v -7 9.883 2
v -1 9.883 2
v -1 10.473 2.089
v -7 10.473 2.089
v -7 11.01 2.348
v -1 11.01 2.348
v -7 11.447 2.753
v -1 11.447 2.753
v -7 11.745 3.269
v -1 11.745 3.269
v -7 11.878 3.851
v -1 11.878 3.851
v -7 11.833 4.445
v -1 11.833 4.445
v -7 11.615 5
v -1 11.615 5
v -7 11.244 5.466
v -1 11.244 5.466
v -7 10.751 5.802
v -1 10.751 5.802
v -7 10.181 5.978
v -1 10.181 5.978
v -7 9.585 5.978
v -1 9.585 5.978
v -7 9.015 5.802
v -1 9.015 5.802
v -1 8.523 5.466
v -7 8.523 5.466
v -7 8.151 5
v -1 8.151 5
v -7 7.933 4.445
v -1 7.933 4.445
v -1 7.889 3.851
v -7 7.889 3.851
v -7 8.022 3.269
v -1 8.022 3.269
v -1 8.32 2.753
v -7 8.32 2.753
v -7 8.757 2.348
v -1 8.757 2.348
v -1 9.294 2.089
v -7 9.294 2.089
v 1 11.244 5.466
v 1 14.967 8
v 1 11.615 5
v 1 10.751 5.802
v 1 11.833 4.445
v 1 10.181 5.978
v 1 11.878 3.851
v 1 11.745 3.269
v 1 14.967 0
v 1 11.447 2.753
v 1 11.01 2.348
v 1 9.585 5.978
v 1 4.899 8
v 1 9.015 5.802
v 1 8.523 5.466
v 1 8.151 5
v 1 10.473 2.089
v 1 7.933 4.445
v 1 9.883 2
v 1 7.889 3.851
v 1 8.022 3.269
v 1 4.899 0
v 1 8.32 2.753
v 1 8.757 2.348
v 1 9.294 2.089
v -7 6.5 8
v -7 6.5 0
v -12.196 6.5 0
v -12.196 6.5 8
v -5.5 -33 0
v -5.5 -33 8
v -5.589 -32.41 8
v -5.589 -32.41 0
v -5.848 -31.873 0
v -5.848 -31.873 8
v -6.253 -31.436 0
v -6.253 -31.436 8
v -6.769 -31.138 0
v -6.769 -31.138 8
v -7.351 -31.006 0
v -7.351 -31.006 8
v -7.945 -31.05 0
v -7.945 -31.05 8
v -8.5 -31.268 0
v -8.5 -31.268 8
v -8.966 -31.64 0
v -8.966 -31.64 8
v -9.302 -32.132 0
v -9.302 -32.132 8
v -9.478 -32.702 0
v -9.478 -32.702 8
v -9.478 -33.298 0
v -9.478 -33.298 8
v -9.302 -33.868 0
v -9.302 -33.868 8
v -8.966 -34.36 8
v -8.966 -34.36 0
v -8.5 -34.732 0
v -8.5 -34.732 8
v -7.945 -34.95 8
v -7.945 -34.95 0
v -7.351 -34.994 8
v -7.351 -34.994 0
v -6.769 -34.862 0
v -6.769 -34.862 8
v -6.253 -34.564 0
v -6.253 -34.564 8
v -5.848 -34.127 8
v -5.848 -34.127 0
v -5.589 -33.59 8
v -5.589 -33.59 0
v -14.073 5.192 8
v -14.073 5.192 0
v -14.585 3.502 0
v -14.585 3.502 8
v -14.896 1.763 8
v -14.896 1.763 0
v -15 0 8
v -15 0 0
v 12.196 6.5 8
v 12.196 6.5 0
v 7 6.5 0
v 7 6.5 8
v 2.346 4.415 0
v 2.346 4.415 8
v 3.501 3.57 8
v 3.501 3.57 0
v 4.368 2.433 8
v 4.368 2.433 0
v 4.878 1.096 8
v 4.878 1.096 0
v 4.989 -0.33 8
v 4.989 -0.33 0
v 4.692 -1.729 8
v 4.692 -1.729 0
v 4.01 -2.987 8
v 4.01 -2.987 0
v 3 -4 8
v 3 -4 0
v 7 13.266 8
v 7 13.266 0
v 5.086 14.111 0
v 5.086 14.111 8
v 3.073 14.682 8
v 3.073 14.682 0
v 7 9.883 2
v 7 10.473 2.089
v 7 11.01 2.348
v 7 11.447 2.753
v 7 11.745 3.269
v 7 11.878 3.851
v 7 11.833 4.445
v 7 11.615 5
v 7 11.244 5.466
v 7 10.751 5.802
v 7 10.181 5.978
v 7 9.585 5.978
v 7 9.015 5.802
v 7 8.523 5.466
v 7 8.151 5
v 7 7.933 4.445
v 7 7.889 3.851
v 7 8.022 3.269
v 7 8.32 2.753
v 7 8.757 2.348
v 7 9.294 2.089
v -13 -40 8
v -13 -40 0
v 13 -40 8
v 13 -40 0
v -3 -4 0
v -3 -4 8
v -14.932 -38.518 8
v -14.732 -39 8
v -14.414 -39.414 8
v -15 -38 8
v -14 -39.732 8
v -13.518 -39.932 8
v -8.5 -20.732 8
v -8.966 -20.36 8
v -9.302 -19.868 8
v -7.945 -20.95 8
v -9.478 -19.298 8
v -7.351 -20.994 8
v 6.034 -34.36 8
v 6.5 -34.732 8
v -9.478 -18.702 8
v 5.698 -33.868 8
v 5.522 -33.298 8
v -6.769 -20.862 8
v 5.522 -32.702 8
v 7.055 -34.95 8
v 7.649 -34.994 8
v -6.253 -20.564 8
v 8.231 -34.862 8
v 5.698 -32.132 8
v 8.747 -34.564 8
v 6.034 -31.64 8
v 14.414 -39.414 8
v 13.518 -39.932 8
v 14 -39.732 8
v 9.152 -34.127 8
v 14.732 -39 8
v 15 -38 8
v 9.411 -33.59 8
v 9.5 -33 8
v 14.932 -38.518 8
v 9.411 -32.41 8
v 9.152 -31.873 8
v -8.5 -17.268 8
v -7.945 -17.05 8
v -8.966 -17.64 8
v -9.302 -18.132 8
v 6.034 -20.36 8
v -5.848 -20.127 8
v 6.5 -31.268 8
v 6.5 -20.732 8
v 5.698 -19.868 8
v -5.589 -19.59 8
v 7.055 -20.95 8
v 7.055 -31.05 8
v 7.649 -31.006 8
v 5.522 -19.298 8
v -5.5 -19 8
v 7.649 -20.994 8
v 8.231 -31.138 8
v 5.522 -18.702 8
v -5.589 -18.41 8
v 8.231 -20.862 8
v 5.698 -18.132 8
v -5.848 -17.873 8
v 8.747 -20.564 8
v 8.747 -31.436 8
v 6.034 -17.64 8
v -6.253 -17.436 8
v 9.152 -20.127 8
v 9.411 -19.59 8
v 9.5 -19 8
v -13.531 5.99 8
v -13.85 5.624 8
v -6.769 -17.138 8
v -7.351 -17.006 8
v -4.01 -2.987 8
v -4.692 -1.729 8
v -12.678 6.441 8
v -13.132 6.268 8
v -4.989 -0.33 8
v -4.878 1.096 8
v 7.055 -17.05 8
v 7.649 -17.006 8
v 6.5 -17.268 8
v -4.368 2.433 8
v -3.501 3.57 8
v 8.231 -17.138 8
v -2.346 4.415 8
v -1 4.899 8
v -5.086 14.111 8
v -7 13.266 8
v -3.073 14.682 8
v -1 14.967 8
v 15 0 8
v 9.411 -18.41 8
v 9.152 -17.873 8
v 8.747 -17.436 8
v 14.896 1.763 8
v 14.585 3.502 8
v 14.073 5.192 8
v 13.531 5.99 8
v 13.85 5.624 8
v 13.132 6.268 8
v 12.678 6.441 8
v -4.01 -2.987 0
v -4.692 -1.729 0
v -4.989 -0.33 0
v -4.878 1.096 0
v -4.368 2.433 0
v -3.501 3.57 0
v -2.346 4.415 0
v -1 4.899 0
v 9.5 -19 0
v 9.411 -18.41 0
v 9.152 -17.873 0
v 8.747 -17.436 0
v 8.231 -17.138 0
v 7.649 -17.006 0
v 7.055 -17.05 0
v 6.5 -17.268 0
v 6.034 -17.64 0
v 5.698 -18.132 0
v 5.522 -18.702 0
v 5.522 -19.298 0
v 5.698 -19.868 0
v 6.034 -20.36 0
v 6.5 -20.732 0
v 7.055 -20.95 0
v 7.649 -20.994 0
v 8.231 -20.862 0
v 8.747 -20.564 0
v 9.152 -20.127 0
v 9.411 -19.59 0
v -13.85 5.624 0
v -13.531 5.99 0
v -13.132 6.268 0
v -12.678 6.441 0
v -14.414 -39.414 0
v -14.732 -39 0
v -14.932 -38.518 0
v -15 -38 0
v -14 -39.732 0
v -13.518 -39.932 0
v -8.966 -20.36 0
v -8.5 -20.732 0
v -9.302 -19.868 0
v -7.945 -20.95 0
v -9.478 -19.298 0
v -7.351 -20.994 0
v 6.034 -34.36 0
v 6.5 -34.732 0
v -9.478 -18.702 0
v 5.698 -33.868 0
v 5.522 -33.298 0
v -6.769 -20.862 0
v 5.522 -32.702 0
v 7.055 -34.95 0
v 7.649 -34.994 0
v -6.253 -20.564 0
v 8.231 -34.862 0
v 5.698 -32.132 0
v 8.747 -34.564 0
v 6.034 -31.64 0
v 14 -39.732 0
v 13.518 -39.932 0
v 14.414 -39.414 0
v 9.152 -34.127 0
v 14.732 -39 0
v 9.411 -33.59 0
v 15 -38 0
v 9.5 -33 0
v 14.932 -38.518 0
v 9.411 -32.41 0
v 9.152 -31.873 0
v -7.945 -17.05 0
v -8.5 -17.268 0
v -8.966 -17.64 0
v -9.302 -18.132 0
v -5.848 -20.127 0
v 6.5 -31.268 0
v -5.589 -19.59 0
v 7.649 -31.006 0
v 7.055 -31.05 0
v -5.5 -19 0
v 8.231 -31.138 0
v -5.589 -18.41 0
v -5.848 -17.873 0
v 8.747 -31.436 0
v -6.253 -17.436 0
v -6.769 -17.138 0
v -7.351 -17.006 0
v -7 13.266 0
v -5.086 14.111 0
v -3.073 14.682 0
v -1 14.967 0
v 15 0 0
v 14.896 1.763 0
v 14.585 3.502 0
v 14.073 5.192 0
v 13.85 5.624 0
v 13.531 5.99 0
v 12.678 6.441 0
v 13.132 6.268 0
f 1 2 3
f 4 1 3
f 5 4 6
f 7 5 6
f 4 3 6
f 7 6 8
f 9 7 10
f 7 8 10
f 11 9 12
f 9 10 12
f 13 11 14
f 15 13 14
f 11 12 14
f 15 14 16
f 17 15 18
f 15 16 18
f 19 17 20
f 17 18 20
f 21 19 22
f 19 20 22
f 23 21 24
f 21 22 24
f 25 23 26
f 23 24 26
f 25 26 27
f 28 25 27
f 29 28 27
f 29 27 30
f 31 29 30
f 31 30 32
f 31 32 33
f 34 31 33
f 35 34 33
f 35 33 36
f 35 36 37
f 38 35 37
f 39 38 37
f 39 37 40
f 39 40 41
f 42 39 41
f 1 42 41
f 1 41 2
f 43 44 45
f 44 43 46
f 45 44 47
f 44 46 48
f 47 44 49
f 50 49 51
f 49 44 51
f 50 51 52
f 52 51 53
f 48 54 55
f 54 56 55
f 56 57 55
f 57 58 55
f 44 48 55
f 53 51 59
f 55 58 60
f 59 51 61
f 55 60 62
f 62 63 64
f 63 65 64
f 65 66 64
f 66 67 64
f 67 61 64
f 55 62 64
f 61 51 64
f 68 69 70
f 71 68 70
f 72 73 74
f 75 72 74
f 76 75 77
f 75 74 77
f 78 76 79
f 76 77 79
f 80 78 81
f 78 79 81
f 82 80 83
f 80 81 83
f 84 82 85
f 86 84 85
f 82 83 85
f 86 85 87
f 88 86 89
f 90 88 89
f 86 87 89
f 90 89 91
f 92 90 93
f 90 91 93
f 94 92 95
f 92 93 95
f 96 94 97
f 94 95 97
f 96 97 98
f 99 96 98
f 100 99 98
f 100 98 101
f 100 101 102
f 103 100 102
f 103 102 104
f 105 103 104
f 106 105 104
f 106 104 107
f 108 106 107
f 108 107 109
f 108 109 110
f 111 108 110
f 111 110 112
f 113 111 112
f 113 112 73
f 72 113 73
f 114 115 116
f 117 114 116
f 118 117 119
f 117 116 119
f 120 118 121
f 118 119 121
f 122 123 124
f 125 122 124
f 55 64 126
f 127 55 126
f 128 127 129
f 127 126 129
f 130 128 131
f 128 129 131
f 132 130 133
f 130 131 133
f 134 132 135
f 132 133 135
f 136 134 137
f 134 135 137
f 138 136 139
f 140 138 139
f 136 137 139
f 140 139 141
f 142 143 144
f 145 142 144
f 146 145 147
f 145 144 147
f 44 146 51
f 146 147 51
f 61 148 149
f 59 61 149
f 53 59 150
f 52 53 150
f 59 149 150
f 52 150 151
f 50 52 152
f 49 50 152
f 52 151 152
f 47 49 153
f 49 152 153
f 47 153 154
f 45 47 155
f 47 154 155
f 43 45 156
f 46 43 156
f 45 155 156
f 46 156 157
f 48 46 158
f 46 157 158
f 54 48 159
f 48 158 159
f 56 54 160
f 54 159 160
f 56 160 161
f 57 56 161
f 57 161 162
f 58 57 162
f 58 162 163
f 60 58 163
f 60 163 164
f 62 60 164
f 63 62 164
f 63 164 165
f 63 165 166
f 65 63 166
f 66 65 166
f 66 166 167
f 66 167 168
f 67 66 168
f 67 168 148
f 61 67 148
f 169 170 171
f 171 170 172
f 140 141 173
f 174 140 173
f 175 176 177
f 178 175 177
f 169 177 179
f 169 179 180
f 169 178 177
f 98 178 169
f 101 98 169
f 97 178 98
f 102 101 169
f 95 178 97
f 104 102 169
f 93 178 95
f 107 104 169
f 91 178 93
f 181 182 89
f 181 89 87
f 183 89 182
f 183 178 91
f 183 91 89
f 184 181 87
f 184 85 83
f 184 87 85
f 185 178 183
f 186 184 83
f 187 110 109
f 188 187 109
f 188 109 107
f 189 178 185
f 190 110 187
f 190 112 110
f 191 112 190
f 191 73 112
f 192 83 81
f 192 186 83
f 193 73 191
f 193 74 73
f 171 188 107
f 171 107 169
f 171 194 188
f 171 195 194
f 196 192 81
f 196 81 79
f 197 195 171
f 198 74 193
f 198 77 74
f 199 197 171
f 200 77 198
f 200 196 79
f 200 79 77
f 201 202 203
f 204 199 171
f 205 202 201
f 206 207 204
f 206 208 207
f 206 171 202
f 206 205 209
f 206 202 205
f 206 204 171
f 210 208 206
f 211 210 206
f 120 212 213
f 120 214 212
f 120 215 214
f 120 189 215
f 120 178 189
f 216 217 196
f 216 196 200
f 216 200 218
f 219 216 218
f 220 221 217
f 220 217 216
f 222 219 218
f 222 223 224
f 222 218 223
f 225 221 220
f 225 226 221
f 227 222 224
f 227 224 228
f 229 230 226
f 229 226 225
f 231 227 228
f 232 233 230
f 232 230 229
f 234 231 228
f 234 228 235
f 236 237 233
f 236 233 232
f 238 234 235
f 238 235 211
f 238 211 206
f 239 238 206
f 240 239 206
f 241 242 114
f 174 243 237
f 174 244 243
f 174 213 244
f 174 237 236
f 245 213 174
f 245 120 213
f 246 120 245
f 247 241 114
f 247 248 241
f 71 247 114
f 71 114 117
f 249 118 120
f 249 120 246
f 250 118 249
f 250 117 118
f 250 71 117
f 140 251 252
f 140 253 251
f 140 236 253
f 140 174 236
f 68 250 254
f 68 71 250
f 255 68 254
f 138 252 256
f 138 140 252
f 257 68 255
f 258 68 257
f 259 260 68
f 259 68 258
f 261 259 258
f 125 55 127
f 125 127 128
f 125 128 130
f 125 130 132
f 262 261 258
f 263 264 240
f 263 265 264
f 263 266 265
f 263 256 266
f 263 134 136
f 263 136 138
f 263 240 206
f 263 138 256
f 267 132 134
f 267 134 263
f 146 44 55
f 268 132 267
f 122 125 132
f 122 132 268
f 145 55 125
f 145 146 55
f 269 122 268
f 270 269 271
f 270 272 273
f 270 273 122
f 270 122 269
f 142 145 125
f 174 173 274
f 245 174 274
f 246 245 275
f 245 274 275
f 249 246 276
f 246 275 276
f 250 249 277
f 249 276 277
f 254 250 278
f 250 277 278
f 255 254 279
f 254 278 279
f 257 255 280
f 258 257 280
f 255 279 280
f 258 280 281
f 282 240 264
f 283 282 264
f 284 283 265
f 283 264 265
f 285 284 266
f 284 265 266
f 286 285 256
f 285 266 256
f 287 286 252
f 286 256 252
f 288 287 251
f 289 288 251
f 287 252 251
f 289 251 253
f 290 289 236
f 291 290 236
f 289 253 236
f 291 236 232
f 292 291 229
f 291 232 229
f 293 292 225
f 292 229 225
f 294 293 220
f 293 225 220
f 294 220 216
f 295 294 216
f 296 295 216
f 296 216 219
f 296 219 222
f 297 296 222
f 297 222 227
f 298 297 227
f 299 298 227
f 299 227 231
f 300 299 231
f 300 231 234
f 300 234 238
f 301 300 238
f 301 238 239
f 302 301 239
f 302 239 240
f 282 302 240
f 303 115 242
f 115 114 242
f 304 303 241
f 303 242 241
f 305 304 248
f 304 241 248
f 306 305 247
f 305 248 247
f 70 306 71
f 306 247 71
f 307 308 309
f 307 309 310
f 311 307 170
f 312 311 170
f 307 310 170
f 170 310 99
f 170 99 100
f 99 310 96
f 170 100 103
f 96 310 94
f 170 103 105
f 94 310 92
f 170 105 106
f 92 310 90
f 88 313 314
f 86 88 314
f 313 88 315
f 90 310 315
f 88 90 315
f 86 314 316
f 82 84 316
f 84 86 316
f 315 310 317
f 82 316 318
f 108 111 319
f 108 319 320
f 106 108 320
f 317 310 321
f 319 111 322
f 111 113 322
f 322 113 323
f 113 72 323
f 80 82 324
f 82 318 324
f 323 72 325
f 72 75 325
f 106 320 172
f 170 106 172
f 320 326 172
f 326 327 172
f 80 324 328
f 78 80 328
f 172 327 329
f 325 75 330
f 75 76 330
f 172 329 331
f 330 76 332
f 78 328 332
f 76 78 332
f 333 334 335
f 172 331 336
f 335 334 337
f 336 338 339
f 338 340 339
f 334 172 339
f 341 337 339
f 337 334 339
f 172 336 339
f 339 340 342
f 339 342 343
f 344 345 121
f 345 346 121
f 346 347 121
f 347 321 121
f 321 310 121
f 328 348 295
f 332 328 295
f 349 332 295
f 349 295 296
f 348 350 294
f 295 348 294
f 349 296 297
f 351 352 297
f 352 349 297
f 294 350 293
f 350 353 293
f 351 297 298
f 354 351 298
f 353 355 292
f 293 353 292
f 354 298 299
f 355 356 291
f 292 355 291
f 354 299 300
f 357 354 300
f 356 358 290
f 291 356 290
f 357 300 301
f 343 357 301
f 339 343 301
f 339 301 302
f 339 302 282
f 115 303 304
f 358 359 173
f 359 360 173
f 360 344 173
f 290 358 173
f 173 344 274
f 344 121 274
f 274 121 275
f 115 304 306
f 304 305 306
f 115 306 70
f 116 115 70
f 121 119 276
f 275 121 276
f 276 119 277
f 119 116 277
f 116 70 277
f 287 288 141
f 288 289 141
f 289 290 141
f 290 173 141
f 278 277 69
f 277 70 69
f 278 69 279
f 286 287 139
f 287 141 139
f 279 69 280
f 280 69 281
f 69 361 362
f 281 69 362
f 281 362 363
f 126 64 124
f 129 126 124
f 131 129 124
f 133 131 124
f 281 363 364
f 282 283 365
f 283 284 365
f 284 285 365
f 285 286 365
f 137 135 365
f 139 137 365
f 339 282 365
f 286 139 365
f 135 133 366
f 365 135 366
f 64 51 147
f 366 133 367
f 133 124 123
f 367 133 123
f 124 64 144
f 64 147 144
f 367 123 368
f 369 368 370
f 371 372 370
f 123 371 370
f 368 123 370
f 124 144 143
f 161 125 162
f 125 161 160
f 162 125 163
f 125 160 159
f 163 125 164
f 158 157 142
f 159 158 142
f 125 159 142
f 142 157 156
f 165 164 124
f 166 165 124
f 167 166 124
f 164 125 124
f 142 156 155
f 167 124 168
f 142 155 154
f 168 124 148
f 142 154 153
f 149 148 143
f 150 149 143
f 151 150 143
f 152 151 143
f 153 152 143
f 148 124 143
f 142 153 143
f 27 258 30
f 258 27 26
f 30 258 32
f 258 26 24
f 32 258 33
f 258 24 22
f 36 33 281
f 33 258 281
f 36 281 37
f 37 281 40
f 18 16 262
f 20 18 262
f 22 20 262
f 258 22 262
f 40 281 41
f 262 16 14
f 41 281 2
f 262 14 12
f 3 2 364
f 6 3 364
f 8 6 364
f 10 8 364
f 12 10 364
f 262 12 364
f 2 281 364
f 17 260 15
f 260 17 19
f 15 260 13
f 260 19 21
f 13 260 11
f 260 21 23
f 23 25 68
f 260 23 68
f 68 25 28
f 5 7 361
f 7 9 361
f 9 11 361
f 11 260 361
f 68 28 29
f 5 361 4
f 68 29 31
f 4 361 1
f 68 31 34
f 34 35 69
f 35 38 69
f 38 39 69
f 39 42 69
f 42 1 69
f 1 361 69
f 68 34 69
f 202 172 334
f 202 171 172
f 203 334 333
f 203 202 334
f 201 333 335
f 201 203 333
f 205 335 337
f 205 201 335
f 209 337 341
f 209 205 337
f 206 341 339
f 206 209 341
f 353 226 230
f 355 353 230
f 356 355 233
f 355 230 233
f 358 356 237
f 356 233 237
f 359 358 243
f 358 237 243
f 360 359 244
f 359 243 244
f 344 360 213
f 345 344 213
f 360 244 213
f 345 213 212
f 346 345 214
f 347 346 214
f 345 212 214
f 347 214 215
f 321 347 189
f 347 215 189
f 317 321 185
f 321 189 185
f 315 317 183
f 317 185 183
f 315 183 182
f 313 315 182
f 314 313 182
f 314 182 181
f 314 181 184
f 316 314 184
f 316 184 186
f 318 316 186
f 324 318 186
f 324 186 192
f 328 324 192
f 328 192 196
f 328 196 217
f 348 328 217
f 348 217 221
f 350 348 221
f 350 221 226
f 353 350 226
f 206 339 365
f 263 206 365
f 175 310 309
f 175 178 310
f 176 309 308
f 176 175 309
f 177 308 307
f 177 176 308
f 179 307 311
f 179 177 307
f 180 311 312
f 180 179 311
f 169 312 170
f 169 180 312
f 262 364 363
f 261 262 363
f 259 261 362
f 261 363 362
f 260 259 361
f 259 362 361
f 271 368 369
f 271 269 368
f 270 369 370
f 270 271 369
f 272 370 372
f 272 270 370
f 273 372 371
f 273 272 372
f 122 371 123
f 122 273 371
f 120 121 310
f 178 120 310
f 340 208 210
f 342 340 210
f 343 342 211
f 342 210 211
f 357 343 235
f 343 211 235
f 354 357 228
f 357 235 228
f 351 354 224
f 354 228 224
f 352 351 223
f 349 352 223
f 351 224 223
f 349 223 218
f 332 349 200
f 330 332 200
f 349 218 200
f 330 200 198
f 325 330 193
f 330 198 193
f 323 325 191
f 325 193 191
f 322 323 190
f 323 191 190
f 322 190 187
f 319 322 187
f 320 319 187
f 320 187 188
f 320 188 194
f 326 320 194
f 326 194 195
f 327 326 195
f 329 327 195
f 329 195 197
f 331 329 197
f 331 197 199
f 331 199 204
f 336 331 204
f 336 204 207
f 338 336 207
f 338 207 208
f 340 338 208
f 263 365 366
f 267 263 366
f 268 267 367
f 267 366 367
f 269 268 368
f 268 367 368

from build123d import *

# Parameters (mm, degrees)
EXTRUDE_1_DEPTH     = 8
SKETCH_2_R          = 2
CUT_EXTRUDE_1_DEPTH = 15
SKETCH_3_R          = 2
CUT_EXTRUDE_2_DEPTH = 15
FILLET_1_R          = 2


with BuildPart() as part:
    # 草图1 → 凸台-拉伸1 (new body)
    with BuildSketch(Plane.XY):
        with BuildLine():
            Line((-15, 0), (-15, -25))
            Line((-15, -25), (-15, -40))
            Line((-15, -40), (15, -40))
            Line((15, -40), (15, 0))
            ThreePointArc((15, 0), (14.624937393, 3.333347603), (13.518505835, 6.5))
            Line((13.518505835, 6.5), (7, 6.5))
            Line((7, 6.5), (7, 13.266499161))
            ThreePointArc((7, 13.266499161), (4.089328898, 14.431818637), (1, 14.966629547))
            Line((1, 14.966629547), (1, 4.898979486))
            ThreePointArc((1, 4.898979486), (4.878315178, 1.096376317), (3, -4))
            Line((3, -4), (-3, -4))
            ThreePointArc((-3, -4), (-4.878315178, 1.096376317), (-1, 4.898979486))
            Line((-1, 4.898979486), (-1, 14.966629547))
            ThreePointArc((-1, 14.966629547), (-4.089328898, 14.431818637), (-7, 13.266499161))
            Line((-7, 13.266499161), (-7, 6.5))
            Line((-7, 6.5), (-13.518505835, 6.5))
            ThreePointArc((-13.518505835, 6.5), (-14.624937393, 3.333347603), (-15, 0))
        make_face()
    extrude(amount=EXTRUDE_1_DEPTH)

    # 草图2 → 切除-拉伸1 (cut)
    with BuildSketch(Plane(origin=(7, 0, 0), x_dir=(0, 0, -1), z_dir=(1, 0, 0))):
        with Locations((-4, 9.883249581)):
            Circle(SKETCH_2_R)
    extrude(amount=-CUT_EXTRUDE_1_DEPTH, mode=Mode.SUBTRACT)

    # 草图3 → 切除-拉伸2 (cut)
    with BuildSketch(Plane.XY.offset(8)):
        with Locations((7.5, -19)):
            Circle(SKETCH_3_R)
        with Locations((7.5, -33)):
            Circle(SKETCH_3_R)
        with Locations((-7.5, -33)):
            Circle(SKETCH_3_R)
        with Locations((-7.5, -19)):
            Circle(SKETCH_3_R)
    extrude(amount=-CUT_EXTRUDE_2_DEPTH, mode=Mode.SUBTRACT)

    # 圆角1
    fillet_1_edges = [part.edges().sort_by_distance(p)[0] for p in [
        (-13.518505835, 6.5, 4),
        (13.518505835, 6.5, 4),
        (15, -40, 4),
        (-15, -40, 4),
    ]]
    fillet(fillet_1_edges, radius=FILLET_1_R)


solid = part.part
